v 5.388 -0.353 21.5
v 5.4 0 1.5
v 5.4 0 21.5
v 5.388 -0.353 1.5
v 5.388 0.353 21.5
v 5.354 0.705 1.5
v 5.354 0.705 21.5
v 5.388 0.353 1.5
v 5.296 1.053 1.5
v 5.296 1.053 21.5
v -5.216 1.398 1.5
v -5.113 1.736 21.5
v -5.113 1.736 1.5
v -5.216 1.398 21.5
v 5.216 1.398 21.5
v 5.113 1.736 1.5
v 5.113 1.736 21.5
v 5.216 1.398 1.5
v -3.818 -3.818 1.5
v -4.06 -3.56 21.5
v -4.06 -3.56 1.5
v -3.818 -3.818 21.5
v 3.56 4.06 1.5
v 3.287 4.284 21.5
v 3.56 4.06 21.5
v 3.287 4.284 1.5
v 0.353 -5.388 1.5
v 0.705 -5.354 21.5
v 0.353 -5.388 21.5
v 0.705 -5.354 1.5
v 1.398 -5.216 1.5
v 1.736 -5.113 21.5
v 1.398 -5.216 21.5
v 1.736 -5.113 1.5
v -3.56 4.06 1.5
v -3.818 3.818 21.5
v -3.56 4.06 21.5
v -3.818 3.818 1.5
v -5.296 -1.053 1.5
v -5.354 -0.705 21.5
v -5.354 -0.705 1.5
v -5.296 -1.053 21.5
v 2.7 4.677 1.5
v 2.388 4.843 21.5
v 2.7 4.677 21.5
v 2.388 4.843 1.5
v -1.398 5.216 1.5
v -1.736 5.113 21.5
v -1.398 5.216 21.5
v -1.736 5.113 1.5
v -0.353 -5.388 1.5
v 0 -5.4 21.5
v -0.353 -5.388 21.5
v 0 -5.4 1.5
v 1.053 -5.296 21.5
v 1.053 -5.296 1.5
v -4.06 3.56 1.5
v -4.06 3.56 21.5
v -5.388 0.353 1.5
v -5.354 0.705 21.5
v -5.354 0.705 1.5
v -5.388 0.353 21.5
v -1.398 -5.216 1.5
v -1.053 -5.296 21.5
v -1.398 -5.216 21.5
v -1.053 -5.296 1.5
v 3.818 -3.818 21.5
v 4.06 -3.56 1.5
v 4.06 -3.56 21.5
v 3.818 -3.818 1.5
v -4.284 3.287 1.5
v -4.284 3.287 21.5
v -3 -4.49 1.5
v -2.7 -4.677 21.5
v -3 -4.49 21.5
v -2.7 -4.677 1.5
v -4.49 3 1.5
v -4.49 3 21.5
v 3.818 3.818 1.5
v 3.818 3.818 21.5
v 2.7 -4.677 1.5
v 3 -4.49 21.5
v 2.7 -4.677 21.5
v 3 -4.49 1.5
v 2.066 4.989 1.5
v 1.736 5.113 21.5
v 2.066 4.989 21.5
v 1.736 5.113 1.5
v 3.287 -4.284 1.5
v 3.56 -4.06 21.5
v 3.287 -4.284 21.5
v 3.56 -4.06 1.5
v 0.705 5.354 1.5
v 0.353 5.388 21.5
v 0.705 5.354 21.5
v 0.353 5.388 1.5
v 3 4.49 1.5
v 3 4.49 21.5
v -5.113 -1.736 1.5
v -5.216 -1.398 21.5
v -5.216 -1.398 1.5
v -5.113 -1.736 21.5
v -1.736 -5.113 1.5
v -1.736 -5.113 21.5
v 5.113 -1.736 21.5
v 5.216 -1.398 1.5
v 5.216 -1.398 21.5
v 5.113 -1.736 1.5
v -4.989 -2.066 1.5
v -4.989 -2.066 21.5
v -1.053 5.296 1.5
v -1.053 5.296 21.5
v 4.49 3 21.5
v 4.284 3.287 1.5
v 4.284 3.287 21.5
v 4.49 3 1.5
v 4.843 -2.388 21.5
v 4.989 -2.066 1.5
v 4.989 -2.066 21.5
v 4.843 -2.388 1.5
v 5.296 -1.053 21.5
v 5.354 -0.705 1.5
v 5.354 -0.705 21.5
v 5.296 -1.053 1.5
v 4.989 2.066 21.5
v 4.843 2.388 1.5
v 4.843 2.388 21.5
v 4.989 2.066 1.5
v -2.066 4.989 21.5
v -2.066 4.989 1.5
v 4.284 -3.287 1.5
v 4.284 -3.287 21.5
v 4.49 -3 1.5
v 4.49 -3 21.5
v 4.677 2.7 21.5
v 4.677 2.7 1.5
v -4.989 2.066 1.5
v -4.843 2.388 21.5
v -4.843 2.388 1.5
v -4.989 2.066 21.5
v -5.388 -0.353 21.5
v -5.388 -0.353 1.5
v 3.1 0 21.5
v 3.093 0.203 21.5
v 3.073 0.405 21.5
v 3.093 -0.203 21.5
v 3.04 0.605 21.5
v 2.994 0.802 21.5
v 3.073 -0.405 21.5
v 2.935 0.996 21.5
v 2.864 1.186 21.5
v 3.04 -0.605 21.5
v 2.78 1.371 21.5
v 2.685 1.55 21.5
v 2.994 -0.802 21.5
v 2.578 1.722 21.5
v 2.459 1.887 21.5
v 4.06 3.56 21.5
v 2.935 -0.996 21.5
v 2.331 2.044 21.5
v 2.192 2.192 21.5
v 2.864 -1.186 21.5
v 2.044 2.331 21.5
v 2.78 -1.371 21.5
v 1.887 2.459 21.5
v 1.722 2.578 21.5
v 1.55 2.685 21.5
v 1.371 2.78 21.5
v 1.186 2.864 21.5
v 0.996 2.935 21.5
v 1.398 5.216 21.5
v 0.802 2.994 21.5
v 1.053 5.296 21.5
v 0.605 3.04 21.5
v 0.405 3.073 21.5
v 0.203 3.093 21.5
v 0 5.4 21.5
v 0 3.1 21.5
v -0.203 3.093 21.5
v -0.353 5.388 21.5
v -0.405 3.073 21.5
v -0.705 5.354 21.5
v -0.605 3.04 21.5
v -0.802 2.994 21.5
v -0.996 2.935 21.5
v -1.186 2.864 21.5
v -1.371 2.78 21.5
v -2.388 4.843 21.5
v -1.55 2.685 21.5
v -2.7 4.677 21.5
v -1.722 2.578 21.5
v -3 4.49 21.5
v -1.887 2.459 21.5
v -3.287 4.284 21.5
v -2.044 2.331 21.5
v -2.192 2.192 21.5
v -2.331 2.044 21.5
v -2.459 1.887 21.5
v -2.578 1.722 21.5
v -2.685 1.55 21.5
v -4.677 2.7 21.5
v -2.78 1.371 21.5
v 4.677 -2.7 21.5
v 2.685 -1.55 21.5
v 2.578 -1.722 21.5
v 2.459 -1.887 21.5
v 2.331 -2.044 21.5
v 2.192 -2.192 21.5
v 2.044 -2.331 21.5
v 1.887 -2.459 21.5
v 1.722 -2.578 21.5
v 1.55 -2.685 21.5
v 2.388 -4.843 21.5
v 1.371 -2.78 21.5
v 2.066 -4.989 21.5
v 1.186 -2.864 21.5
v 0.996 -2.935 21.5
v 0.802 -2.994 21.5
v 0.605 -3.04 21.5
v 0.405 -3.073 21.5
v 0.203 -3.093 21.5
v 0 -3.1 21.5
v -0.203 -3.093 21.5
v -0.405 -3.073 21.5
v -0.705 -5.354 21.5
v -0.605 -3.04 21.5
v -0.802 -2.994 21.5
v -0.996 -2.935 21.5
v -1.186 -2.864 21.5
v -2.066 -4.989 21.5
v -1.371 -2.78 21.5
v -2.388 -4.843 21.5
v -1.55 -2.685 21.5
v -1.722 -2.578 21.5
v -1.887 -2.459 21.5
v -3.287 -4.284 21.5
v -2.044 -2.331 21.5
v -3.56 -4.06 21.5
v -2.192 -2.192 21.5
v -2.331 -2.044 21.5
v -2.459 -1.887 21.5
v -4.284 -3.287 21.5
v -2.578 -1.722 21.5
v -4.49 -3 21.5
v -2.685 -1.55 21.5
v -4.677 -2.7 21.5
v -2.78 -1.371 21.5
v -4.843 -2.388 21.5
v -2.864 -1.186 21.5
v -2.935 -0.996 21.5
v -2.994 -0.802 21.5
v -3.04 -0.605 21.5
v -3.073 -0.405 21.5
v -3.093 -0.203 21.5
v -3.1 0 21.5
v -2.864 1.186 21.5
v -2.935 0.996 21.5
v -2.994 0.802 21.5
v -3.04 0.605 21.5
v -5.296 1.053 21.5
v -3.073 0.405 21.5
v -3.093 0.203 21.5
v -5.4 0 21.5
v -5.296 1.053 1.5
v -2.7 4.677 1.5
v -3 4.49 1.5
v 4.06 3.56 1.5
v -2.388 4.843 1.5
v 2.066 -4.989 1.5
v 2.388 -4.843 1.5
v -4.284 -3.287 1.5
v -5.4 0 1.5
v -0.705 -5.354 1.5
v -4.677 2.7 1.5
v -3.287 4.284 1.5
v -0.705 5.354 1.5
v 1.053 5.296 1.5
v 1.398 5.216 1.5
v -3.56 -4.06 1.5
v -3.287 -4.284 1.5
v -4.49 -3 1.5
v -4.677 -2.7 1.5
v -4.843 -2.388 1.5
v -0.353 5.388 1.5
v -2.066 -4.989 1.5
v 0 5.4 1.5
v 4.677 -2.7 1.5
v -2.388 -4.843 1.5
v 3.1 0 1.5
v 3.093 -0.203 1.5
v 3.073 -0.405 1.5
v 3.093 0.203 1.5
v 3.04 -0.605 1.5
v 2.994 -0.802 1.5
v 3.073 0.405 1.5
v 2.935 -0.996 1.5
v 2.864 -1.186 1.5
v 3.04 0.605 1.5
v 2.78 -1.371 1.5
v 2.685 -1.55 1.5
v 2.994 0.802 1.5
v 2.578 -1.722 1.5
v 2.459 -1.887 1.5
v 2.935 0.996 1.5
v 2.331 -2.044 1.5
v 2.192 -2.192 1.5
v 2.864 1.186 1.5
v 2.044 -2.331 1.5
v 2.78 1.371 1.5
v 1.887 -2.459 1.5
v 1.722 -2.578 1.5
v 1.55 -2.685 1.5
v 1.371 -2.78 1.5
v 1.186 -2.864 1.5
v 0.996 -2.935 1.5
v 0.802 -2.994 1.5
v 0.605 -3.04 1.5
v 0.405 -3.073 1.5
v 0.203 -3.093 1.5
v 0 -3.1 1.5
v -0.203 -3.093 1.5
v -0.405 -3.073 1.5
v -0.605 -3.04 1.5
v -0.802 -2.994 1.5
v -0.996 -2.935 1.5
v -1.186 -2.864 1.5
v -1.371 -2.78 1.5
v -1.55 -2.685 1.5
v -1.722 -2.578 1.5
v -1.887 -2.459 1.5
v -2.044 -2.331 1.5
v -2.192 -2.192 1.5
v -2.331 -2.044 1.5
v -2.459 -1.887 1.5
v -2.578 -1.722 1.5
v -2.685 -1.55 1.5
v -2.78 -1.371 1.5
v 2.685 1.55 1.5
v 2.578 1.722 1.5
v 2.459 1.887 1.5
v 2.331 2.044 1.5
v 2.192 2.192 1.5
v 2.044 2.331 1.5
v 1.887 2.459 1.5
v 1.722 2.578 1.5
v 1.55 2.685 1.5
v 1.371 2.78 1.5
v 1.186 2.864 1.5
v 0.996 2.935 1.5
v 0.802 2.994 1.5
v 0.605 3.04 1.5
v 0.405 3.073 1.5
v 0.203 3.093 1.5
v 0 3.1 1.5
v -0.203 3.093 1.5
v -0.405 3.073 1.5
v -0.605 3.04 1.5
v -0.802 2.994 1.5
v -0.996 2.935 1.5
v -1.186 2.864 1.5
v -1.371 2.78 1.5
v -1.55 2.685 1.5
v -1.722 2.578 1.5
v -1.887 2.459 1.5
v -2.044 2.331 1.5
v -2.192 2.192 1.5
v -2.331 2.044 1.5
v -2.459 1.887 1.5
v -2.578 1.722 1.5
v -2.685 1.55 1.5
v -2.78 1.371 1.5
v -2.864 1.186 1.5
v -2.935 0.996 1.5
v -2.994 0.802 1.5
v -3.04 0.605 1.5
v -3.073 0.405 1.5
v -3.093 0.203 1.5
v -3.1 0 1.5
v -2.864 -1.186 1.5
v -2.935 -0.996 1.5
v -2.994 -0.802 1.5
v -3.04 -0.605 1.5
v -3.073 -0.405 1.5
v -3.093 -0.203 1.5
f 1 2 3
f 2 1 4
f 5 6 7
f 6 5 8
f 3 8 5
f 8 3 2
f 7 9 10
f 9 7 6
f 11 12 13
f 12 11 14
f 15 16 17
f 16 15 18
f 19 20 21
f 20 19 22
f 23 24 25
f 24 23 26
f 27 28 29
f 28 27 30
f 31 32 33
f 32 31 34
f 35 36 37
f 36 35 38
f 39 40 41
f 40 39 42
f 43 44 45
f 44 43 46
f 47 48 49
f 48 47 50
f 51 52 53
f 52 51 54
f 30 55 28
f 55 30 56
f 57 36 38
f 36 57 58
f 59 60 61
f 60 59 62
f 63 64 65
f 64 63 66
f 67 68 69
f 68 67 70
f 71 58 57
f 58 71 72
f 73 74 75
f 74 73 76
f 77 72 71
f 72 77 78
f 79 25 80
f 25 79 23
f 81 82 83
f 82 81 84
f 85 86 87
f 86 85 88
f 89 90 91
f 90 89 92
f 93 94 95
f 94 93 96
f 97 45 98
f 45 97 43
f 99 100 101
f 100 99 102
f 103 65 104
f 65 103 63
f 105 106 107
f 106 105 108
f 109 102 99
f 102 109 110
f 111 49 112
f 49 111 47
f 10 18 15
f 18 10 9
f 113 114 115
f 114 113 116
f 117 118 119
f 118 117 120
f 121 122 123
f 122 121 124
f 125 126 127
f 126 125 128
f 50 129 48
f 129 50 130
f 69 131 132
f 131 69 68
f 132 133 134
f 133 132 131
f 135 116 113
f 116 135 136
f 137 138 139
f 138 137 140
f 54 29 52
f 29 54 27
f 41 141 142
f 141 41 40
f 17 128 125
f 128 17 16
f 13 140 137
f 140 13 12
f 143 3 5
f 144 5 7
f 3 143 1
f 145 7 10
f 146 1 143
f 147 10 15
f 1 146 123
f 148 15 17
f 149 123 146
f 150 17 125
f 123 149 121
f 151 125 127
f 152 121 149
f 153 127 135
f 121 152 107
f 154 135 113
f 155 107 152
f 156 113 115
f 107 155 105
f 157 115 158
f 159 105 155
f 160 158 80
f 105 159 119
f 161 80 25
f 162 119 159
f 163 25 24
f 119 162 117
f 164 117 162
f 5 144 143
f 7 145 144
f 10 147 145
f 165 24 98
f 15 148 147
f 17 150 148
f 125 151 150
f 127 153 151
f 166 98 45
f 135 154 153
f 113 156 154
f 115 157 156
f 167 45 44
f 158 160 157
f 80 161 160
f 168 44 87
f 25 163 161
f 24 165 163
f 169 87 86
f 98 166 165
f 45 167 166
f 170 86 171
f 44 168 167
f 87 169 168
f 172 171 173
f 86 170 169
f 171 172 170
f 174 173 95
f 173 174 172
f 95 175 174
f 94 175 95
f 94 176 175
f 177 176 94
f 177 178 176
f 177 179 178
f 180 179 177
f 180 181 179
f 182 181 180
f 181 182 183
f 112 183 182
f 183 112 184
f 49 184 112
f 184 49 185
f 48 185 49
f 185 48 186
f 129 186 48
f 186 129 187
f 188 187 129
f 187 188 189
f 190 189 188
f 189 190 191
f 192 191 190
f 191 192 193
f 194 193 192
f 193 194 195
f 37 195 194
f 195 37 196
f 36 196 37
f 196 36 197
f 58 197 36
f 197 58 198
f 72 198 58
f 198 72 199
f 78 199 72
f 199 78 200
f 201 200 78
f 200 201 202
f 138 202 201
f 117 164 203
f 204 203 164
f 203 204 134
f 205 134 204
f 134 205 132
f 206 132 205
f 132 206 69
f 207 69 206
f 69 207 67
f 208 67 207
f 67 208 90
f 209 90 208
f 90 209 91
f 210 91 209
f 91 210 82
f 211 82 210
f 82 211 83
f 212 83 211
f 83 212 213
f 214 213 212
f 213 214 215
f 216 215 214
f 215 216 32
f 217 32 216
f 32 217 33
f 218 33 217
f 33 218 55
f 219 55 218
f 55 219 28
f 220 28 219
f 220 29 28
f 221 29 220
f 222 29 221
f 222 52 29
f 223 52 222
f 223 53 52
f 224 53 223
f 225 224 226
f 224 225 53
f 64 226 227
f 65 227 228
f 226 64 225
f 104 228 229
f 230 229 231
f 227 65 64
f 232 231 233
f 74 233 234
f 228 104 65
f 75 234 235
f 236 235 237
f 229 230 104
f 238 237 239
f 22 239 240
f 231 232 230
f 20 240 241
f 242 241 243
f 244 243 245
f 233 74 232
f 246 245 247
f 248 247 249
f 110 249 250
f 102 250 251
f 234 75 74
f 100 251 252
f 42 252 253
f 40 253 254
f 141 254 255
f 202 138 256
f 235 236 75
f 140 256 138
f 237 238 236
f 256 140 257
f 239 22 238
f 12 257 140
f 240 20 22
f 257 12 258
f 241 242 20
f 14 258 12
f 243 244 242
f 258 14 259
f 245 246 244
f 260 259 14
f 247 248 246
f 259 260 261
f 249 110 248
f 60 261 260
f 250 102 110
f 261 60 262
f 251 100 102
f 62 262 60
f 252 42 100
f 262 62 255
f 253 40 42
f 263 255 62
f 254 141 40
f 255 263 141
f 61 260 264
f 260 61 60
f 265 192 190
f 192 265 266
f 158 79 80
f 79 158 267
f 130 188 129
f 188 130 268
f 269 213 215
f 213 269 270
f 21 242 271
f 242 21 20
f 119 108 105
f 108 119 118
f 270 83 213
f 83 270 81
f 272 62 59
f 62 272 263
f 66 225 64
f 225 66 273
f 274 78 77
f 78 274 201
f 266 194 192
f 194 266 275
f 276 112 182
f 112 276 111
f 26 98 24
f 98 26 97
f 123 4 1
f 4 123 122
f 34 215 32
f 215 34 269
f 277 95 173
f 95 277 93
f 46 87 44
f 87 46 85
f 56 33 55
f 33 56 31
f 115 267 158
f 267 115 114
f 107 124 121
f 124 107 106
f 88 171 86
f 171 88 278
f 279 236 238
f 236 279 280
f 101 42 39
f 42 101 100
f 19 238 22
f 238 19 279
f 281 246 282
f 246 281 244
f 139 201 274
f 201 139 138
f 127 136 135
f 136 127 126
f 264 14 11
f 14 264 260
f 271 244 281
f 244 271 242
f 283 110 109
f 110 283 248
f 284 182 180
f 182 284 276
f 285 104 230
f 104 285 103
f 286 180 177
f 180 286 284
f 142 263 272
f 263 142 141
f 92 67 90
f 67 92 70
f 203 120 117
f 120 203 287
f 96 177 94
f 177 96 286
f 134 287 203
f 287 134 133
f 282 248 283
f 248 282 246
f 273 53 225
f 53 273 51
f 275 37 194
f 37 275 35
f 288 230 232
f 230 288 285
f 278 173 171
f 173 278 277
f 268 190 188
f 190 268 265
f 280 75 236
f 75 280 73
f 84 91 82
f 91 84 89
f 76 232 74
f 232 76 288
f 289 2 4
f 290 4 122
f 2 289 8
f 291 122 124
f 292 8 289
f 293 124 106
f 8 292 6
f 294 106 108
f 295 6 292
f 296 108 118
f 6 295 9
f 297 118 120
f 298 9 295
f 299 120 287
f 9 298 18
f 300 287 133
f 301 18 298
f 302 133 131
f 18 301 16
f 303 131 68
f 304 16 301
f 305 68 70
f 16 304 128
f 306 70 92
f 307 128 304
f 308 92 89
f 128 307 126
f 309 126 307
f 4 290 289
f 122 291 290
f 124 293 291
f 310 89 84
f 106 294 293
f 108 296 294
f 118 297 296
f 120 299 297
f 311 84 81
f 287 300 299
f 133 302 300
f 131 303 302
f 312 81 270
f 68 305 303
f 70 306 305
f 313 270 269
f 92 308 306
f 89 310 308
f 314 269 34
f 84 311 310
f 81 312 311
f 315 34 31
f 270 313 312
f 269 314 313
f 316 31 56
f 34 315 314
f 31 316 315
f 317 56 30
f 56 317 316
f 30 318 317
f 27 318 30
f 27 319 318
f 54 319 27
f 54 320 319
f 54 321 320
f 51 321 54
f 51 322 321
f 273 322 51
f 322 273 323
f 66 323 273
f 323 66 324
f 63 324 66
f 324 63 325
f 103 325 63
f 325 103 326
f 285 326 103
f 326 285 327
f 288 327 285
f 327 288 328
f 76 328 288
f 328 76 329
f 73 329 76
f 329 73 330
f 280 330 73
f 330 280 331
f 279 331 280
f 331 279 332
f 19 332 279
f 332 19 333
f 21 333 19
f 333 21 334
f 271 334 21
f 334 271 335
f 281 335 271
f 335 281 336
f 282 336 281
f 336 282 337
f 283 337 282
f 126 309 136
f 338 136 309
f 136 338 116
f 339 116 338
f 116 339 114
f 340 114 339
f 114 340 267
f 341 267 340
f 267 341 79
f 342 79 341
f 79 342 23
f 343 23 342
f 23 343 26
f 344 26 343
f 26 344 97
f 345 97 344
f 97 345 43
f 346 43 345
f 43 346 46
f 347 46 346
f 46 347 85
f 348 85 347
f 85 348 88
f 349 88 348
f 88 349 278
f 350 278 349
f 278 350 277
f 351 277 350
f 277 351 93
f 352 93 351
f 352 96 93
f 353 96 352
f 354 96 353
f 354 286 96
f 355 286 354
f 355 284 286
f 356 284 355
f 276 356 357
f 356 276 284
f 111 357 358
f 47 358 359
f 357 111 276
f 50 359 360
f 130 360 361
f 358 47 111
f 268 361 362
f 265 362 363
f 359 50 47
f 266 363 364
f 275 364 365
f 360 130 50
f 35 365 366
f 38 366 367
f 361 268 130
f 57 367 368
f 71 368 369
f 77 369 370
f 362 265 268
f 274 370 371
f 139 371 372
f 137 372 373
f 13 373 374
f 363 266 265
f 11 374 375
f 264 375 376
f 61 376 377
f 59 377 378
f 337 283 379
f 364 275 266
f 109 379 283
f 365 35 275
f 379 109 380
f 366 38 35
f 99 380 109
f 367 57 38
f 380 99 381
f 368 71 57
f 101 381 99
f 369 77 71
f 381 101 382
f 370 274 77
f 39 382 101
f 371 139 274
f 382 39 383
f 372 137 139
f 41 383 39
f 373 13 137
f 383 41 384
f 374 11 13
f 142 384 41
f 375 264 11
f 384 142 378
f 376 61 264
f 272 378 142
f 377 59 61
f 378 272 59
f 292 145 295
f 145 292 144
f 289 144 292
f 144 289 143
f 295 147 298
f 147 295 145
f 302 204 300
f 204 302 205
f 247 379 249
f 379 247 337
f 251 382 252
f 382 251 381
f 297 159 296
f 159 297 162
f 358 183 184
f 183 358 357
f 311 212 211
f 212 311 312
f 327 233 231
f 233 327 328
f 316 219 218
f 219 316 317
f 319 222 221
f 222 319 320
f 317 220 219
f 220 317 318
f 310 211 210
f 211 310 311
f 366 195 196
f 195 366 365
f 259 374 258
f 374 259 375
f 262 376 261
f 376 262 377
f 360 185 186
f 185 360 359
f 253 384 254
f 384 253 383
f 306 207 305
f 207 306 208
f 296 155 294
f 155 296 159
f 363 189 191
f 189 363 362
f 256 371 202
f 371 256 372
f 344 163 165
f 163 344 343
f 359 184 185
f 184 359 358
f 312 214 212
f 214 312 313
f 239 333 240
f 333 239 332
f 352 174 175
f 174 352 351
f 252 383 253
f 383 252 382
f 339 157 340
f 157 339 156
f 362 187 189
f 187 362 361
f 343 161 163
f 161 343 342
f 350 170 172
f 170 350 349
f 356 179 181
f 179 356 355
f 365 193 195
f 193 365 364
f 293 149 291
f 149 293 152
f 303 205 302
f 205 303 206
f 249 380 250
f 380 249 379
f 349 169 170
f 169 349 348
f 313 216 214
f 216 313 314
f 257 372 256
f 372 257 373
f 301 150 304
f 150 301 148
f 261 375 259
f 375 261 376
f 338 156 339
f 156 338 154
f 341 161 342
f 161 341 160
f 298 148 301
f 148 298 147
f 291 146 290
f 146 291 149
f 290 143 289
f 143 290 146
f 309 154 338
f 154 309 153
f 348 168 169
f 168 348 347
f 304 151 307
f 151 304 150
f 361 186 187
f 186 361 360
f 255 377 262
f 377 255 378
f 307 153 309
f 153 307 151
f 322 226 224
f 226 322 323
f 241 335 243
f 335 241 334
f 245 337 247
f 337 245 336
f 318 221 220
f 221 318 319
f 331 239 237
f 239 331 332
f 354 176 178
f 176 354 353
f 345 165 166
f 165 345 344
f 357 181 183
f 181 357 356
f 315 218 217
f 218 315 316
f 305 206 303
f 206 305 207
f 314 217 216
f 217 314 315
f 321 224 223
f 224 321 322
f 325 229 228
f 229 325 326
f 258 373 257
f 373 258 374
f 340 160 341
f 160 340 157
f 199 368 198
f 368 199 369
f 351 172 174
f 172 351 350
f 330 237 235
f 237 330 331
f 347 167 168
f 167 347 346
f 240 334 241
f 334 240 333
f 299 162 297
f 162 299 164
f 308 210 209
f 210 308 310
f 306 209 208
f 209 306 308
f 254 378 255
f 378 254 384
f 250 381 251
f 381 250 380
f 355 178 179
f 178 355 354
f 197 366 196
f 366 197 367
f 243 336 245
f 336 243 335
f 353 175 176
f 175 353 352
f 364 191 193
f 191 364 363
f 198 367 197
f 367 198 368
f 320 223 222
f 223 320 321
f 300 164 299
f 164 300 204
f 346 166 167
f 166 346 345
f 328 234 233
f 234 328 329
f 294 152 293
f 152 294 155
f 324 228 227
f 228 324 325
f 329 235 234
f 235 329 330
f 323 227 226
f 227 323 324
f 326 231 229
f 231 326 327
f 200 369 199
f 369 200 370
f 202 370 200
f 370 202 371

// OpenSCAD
// PCR Tube Adapter Sleeve - fits 0.2mL tubes into 1.5mL rack holes.
// Print orientation: Collar on bed (z=0 to 1.5), body rises to z=21.5.

// Dimensions
collar_od = 13;      // Collar outer diameter
collar_t  = 1.5;     // Collar thickness (height)
body_od   = 10.8;    // Sleeve body outer diameter
bore_d    = 6.2;     // Bore diameter
total_h   = 21.5;    // Total height of the part (Collar + Body)

// Ensure smooth rendering for cylindrical surfaces
$fn = 96;

module adapter() {
    difference() {
        // 1. Main Body Cylinder (Outer Shell)
        // Starts at z=0, goes up to total_h
        cylinder(h = total_h, d = body_od);

        // 2. Collar (Outer Ring)
        // Starts at z=0, goes up to collar_t
        // We subtract this from the main body to create the step down
        cylinder(h = collar_t, d = collar_od);

        // 3. Bore (Inner Hole)
        // Runs through the full height of the part
        translate([0, 0, -1]) cylinder(h = total_h + 2, d = bore_d);
    }
}

// Translate the whole part down so the collar sits on the bed (z=0)
// The module is already defined with z=0 start, so no translation needed if we assume the module starts at 0.
// However, to be explicit and safe against any coordinate shifts:
translate([0, 0, 0]) adapter();
